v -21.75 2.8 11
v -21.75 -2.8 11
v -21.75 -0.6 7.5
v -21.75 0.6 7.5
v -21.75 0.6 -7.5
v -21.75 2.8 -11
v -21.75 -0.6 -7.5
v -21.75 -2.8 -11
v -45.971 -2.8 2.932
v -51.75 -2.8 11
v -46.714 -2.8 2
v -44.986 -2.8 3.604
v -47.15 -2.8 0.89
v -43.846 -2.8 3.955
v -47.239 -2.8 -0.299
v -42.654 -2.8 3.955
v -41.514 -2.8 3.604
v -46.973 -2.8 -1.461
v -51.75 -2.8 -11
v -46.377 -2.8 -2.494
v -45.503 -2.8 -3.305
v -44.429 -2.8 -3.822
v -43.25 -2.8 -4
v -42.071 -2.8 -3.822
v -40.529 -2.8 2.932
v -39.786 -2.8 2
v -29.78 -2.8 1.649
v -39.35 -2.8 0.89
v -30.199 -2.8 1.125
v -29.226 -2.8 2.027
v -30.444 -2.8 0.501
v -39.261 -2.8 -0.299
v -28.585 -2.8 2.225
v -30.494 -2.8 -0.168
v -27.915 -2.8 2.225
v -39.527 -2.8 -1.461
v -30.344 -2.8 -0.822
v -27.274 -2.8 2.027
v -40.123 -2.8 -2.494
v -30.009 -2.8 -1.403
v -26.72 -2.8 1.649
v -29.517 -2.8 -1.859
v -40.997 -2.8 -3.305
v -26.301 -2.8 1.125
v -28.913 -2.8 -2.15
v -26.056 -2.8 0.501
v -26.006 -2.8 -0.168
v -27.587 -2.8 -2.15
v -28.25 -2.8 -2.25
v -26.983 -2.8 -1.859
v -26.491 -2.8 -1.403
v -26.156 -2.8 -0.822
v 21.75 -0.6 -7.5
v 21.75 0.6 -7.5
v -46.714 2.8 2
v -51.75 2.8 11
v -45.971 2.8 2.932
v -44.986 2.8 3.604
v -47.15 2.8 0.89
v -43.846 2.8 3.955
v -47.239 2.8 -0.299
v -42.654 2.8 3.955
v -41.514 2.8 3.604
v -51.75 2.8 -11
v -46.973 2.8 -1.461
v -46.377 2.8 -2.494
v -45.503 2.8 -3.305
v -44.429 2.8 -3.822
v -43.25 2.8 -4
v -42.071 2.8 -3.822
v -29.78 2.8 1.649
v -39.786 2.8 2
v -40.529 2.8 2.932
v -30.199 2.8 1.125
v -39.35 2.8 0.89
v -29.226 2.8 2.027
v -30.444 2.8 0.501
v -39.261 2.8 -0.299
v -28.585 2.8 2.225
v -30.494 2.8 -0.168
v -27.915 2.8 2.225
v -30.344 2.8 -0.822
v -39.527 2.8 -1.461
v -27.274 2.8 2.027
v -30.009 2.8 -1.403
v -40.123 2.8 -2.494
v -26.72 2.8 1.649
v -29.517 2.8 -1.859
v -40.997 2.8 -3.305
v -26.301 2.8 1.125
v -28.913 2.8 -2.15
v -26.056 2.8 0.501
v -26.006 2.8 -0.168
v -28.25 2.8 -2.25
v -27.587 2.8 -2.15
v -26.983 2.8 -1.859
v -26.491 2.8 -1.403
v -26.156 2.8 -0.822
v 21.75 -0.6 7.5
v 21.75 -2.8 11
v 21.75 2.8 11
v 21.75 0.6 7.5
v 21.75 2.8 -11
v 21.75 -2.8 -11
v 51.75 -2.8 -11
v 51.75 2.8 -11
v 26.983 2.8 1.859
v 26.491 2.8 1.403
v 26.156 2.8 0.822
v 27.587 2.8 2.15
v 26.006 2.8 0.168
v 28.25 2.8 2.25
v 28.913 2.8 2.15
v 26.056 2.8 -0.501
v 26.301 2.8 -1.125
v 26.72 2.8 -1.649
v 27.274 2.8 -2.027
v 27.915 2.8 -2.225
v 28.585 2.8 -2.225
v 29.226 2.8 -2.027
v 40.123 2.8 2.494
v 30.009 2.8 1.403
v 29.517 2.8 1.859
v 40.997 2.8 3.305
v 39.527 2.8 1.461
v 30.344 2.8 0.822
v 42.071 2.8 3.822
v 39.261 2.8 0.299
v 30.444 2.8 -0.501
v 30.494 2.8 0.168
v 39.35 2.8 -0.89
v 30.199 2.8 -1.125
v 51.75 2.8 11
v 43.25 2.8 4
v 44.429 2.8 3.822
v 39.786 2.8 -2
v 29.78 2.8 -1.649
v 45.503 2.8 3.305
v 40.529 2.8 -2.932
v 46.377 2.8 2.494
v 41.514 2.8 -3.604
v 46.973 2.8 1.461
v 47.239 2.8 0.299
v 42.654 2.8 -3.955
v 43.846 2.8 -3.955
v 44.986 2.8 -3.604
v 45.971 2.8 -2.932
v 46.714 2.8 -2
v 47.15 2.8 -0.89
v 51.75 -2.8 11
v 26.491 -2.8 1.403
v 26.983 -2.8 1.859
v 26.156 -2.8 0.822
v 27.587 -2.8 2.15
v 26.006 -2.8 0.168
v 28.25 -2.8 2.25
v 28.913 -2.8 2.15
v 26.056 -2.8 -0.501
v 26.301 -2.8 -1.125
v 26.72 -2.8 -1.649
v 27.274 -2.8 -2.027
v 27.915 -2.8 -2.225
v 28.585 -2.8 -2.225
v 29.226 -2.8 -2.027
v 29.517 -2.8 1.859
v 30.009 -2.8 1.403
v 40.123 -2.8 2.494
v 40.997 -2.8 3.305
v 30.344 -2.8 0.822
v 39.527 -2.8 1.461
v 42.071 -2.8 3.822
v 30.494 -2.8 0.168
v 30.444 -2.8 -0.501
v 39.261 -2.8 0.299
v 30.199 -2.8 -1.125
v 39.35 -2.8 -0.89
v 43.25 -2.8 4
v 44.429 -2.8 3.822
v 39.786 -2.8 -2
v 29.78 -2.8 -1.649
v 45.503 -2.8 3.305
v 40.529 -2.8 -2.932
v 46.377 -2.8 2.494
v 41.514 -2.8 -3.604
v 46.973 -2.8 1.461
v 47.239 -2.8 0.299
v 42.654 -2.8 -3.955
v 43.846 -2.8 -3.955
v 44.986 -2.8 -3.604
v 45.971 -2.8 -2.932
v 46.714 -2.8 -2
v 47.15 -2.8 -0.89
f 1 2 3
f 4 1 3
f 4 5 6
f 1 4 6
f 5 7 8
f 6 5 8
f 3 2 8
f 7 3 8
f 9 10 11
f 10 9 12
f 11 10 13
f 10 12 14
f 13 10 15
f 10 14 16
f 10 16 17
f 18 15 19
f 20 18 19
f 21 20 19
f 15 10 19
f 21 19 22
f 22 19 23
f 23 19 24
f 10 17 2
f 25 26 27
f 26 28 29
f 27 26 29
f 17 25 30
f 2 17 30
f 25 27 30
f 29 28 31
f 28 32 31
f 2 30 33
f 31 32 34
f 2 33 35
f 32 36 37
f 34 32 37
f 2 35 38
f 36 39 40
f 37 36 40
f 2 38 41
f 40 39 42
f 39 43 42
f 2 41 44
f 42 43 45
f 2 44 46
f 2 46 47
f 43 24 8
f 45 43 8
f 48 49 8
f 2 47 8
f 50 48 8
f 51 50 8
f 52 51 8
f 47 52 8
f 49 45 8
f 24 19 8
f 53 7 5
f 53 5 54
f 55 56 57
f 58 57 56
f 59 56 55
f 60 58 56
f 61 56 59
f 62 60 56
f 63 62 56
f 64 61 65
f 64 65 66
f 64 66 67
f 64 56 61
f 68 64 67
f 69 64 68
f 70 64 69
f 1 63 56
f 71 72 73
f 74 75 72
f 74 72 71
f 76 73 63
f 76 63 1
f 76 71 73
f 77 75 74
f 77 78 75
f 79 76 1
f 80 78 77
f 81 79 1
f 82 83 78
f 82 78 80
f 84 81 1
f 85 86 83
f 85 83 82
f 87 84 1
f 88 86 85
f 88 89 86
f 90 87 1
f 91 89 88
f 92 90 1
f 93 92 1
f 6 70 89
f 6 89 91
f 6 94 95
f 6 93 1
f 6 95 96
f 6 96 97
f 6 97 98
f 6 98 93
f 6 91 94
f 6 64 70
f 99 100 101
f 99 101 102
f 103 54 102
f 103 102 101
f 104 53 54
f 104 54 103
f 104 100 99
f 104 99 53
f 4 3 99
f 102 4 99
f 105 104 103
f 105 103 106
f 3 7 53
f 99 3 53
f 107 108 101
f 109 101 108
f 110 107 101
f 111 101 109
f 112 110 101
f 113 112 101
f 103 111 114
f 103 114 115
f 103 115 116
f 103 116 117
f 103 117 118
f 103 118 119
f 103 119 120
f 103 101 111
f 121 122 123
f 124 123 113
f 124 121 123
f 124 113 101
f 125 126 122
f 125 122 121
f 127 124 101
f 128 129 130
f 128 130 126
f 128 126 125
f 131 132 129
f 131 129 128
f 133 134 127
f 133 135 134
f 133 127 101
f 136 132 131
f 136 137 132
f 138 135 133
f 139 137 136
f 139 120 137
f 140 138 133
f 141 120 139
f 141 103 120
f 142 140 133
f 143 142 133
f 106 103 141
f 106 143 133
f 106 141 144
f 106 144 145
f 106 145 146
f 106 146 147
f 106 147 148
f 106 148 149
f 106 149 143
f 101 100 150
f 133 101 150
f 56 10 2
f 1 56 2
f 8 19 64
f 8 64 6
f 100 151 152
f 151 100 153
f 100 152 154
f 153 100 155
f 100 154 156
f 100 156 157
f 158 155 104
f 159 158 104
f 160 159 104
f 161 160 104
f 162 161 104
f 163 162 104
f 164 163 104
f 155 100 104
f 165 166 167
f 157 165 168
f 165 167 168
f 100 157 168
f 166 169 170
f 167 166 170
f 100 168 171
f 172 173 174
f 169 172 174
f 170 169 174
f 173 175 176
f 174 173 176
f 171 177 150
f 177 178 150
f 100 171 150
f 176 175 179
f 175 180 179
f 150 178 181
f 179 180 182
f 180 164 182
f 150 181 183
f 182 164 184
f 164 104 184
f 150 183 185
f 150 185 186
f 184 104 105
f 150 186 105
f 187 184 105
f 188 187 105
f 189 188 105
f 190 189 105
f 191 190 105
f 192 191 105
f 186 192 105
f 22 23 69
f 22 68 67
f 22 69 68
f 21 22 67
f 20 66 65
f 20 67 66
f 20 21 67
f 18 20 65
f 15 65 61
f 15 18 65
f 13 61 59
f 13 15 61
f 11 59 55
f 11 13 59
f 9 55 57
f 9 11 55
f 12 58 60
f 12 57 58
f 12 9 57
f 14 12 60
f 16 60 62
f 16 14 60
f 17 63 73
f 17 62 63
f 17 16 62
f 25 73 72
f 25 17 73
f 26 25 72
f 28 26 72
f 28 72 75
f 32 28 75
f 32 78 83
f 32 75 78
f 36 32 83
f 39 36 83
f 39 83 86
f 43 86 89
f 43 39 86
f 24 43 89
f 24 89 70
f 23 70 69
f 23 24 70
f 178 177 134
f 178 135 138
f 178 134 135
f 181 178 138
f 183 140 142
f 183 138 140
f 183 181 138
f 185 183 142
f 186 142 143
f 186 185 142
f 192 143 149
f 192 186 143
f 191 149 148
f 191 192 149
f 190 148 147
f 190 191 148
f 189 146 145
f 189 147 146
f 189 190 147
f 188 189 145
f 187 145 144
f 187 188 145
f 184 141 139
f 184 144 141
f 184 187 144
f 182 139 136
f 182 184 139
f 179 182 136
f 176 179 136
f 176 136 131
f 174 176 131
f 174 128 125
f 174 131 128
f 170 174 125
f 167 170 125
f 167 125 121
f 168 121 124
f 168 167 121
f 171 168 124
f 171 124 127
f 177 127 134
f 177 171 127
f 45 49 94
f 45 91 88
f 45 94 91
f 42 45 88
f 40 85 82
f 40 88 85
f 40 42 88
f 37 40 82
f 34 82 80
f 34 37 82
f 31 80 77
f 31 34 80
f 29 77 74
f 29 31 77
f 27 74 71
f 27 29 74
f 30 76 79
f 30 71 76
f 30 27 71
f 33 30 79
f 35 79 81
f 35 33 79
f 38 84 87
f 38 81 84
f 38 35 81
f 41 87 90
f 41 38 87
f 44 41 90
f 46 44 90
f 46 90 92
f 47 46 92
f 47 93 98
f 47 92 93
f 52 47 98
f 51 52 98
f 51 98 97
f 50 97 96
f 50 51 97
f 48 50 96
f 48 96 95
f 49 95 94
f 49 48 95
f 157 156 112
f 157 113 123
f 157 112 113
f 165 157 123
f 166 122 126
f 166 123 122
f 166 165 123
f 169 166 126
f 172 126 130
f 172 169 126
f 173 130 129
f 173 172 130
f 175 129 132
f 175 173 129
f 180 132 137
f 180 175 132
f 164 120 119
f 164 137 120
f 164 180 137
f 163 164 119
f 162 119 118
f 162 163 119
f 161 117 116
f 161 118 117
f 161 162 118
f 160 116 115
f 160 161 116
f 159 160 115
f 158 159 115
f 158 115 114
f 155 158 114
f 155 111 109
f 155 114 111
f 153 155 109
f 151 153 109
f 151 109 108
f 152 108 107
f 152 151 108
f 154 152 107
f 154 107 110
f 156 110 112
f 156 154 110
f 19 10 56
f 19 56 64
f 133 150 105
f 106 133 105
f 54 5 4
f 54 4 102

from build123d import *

# Parameters (mm, degrees)
BOSS_EXTRUDE1_DEPTH      = 0.6
BOSS_EXTRUDE1_DEPTH_BACK = 0.6
SKETCH2_W                = 43.5
SKETCH2_H                = 15
BOSS_EXTRUDE2_DEPTH      = 2.8
BOSS_EXTRUDE2_DEPTH_BACK = 2.8
SKETCH3_W                = 30
SKETCH3_H                = 22
CUT_EXTRUDE1_DEPTH       = 53.980208569
CUT_EXTRUDE1_DEPTH_BACK  = 53.980208569
SKETCH4_R                = 2.25
SKETCH4_R_2              = 4


with BuildPart() as part:
    # Sketch2 → Boss-Extrude1 (new, two sides: drawn at the far end of the back side and taken through both)
    with BuildSketch(Plane(origin=(0, 0, 0), x_dir=(1, 0, 0), z_dir=(0, 1, 0)).offset(-BOSS_EXTRUDE1_DEPTH_BACK)):
        Rectangle(SKETCH2_W, SKETCH2_H)
    extrude(amount=BOSS_EXTRUDE1_DEPTH + BOSS_EXTRUDE1_DEPTH_BACK)

    # Sketch3 → Boss-Extrude2 (add, two sides: drawn at the far end of the back side and taken through both)
    with BuildSketch(Plane(origin=(0, 0, 0), x_dir=(1, 0, 0), z_dir=(0, 1, 0)).offset(-BOSS_EXTRUDE2_DEPTH_BACK)):
        with Locations((36.75, 0)):
            Rectangle(SKETCH3_W, SKETCH3_H)
        with Locations((-36.75, 0)):
            Rectangle(SKETCH3_W, SKETCH3_H)
    extrude(amount=BOSS_EXTRUDE2_DEPTH + BOSS_EXTRUDE2_DEPTH_BACK)

    # Sketch4 → Cut-Extrude1 (cut, two sides: drawn at the far end of the back side and taken through both)
    with BuildSketch(Plane(origin=(0, 0, 0), x_dir=(1, 0, 0), z_dir=(0, 1, 0)).offset(-CUT_EXTRUDE1_DEPTH_BACK)):
        with Locations((28.25, 0)):
            Circle(SKETCH4_R)
        with Locations((43.25, 0)):
            Circle(SKETCH4_R_2)
        with Locations((-43.25, 0)):
            Circle(SKETCH4_R_2)
        with Locations((-28.25, 0)):
            Circle(SKETCH4_R)
    extrude(amount=CUT_EXTRUDE1_DEPTH + CUT_EXTRUDE1_DEPTH_BACK, mode=Mode.SUBTRACT)


solid = part.part
